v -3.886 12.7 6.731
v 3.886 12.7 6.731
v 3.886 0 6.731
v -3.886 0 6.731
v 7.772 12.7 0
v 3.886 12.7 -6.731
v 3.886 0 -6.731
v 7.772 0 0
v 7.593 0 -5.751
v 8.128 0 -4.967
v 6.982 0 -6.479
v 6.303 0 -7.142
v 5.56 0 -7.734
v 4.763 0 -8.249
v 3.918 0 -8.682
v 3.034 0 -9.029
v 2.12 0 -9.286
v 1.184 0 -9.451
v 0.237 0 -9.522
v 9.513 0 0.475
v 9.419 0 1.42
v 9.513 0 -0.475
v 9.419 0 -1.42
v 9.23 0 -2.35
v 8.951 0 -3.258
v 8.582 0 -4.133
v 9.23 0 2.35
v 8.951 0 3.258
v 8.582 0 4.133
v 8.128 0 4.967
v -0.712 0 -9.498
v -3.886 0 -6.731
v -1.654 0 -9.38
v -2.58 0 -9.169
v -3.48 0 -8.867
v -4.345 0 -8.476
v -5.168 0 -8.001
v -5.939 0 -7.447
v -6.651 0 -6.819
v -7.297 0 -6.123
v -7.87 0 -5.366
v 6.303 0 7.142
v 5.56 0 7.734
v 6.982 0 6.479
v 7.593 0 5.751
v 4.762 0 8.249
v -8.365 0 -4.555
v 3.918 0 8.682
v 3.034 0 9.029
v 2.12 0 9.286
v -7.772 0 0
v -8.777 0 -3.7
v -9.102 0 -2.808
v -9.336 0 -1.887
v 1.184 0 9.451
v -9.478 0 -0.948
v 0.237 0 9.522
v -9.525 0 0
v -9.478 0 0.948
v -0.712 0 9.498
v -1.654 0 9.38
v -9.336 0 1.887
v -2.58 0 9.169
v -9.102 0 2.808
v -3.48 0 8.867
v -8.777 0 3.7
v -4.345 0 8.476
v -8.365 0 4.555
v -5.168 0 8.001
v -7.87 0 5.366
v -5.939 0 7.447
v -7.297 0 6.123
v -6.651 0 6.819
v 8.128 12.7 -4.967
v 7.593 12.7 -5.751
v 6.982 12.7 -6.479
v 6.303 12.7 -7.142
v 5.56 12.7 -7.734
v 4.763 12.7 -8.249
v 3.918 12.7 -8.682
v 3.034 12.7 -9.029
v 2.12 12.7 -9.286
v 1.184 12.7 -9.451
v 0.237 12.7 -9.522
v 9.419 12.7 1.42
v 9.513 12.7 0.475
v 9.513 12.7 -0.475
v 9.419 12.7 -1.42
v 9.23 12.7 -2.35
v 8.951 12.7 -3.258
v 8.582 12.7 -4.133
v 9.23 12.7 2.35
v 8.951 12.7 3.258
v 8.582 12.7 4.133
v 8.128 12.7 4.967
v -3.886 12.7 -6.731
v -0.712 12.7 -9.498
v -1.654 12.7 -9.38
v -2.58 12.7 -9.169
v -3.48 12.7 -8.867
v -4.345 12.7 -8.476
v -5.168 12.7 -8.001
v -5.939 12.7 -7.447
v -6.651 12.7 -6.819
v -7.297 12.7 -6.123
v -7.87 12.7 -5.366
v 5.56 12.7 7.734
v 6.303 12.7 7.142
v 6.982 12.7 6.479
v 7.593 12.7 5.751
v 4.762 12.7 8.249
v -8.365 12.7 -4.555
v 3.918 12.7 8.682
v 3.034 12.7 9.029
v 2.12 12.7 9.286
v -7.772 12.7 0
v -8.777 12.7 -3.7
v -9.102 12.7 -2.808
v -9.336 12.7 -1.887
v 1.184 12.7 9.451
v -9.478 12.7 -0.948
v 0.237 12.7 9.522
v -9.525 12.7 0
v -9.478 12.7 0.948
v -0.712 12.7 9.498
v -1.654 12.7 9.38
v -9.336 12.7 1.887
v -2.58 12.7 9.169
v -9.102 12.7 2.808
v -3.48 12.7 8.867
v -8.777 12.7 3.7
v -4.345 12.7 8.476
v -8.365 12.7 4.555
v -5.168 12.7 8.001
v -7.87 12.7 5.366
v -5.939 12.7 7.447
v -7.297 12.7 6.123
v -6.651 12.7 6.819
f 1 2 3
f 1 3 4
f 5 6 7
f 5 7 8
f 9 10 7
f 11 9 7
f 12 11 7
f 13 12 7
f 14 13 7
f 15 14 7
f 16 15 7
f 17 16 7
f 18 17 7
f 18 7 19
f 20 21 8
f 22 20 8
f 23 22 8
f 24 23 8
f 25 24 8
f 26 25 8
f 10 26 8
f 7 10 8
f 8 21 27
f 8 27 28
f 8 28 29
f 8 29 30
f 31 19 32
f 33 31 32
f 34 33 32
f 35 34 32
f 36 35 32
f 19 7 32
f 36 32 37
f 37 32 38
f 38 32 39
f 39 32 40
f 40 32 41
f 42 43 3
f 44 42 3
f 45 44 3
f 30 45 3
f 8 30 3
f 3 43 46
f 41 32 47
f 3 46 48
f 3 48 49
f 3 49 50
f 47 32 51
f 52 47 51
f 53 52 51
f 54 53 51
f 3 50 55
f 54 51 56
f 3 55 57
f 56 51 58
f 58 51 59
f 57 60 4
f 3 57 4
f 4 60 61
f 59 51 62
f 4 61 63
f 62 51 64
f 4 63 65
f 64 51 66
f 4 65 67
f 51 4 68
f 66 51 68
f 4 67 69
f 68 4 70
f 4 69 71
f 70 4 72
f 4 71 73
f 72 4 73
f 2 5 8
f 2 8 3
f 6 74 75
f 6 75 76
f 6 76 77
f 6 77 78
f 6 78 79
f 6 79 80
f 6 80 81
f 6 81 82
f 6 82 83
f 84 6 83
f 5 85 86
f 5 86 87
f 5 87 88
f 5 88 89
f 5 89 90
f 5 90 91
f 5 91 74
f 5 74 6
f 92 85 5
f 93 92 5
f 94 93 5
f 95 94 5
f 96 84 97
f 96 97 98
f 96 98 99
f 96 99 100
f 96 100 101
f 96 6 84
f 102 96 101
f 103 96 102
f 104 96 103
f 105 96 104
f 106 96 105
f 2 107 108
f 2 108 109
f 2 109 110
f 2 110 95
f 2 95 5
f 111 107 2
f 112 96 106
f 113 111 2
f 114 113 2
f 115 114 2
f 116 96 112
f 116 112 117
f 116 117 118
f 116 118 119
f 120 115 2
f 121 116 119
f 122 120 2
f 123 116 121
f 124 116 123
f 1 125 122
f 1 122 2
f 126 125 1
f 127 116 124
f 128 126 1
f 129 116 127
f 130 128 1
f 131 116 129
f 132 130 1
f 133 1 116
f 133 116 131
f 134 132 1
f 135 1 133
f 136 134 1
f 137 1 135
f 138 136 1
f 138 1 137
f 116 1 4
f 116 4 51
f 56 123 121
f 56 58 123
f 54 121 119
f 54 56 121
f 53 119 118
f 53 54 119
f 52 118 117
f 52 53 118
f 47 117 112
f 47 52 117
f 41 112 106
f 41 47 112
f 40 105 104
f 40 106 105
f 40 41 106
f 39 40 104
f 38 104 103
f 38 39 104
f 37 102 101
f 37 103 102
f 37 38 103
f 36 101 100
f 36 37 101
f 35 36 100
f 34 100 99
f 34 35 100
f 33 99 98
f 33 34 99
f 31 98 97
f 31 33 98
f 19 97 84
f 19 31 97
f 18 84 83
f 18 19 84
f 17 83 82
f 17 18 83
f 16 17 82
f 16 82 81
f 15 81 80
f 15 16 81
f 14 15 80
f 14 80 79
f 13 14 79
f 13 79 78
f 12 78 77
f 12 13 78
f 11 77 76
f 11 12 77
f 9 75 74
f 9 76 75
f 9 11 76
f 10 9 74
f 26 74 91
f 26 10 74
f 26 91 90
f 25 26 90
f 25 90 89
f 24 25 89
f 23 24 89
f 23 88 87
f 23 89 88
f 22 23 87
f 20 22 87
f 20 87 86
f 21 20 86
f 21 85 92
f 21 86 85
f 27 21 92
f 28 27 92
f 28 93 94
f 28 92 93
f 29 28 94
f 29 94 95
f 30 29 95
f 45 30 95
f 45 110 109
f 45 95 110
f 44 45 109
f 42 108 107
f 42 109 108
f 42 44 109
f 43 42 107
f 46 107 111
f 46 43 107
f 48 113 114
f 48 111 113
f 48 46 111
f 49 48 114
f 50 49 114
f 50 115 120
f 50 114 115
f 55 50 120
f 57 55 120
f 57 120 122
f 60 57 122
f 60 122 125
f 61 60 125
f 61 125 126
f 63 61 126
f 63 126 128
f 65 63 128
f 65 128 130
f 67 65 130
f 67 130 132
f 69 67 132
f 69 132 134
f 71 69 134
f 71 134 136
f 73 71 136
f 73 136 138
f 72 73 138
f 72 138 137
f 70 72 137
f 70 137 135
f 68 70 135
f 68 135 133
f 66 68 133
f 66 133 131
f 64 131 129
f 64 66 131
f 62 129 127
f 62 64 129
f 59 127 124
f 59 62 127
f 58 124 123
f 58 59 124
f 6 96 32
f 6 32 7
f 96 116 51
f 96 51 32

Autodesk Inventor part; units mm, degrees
ref_plane "YZ Plane" through (0, 0, 0) normal (1, 0, 0) x (0, 1, 0)
ref_plane "XZ Plane" through (0, 0, 0) normal (0, 1, 0) x (-1, 0, 0)
ref_plane "XY Plane" through (0, 0, 0) normal (0, 0, 1) x (1, 0, 0)
sketch "Sketch1" plane through (0, 0, 0) normal (0, 1, 0) x (-1, 0, 0)
  line L0 (-3.8861, 6.731) -> (3.8861, 6.731)
  line L1 (3.8861, 6.731) -> (7.7723, 0)
  line L2 (7.7723, 0) -> (3.8861, -6.731)
  line L3 (3.8861, -6.731) -> (-3.8861, -6.731)
  line L4 (-3.8861, -6.731) -> (-7.7723, 0)
  line L5 (-7.7723, 0) -> (-3.8861, 6.731)
  circle A0 centre (0, 0) radius 9.525
  point P0 (5.8292, -3.3655)
  dimension "d0" = 13.462
  dimension "d1" = 19.05
extrude "Extrusion1" add sketch "Sketch1" along normal blind 12.7
properties part number "SP-003"
